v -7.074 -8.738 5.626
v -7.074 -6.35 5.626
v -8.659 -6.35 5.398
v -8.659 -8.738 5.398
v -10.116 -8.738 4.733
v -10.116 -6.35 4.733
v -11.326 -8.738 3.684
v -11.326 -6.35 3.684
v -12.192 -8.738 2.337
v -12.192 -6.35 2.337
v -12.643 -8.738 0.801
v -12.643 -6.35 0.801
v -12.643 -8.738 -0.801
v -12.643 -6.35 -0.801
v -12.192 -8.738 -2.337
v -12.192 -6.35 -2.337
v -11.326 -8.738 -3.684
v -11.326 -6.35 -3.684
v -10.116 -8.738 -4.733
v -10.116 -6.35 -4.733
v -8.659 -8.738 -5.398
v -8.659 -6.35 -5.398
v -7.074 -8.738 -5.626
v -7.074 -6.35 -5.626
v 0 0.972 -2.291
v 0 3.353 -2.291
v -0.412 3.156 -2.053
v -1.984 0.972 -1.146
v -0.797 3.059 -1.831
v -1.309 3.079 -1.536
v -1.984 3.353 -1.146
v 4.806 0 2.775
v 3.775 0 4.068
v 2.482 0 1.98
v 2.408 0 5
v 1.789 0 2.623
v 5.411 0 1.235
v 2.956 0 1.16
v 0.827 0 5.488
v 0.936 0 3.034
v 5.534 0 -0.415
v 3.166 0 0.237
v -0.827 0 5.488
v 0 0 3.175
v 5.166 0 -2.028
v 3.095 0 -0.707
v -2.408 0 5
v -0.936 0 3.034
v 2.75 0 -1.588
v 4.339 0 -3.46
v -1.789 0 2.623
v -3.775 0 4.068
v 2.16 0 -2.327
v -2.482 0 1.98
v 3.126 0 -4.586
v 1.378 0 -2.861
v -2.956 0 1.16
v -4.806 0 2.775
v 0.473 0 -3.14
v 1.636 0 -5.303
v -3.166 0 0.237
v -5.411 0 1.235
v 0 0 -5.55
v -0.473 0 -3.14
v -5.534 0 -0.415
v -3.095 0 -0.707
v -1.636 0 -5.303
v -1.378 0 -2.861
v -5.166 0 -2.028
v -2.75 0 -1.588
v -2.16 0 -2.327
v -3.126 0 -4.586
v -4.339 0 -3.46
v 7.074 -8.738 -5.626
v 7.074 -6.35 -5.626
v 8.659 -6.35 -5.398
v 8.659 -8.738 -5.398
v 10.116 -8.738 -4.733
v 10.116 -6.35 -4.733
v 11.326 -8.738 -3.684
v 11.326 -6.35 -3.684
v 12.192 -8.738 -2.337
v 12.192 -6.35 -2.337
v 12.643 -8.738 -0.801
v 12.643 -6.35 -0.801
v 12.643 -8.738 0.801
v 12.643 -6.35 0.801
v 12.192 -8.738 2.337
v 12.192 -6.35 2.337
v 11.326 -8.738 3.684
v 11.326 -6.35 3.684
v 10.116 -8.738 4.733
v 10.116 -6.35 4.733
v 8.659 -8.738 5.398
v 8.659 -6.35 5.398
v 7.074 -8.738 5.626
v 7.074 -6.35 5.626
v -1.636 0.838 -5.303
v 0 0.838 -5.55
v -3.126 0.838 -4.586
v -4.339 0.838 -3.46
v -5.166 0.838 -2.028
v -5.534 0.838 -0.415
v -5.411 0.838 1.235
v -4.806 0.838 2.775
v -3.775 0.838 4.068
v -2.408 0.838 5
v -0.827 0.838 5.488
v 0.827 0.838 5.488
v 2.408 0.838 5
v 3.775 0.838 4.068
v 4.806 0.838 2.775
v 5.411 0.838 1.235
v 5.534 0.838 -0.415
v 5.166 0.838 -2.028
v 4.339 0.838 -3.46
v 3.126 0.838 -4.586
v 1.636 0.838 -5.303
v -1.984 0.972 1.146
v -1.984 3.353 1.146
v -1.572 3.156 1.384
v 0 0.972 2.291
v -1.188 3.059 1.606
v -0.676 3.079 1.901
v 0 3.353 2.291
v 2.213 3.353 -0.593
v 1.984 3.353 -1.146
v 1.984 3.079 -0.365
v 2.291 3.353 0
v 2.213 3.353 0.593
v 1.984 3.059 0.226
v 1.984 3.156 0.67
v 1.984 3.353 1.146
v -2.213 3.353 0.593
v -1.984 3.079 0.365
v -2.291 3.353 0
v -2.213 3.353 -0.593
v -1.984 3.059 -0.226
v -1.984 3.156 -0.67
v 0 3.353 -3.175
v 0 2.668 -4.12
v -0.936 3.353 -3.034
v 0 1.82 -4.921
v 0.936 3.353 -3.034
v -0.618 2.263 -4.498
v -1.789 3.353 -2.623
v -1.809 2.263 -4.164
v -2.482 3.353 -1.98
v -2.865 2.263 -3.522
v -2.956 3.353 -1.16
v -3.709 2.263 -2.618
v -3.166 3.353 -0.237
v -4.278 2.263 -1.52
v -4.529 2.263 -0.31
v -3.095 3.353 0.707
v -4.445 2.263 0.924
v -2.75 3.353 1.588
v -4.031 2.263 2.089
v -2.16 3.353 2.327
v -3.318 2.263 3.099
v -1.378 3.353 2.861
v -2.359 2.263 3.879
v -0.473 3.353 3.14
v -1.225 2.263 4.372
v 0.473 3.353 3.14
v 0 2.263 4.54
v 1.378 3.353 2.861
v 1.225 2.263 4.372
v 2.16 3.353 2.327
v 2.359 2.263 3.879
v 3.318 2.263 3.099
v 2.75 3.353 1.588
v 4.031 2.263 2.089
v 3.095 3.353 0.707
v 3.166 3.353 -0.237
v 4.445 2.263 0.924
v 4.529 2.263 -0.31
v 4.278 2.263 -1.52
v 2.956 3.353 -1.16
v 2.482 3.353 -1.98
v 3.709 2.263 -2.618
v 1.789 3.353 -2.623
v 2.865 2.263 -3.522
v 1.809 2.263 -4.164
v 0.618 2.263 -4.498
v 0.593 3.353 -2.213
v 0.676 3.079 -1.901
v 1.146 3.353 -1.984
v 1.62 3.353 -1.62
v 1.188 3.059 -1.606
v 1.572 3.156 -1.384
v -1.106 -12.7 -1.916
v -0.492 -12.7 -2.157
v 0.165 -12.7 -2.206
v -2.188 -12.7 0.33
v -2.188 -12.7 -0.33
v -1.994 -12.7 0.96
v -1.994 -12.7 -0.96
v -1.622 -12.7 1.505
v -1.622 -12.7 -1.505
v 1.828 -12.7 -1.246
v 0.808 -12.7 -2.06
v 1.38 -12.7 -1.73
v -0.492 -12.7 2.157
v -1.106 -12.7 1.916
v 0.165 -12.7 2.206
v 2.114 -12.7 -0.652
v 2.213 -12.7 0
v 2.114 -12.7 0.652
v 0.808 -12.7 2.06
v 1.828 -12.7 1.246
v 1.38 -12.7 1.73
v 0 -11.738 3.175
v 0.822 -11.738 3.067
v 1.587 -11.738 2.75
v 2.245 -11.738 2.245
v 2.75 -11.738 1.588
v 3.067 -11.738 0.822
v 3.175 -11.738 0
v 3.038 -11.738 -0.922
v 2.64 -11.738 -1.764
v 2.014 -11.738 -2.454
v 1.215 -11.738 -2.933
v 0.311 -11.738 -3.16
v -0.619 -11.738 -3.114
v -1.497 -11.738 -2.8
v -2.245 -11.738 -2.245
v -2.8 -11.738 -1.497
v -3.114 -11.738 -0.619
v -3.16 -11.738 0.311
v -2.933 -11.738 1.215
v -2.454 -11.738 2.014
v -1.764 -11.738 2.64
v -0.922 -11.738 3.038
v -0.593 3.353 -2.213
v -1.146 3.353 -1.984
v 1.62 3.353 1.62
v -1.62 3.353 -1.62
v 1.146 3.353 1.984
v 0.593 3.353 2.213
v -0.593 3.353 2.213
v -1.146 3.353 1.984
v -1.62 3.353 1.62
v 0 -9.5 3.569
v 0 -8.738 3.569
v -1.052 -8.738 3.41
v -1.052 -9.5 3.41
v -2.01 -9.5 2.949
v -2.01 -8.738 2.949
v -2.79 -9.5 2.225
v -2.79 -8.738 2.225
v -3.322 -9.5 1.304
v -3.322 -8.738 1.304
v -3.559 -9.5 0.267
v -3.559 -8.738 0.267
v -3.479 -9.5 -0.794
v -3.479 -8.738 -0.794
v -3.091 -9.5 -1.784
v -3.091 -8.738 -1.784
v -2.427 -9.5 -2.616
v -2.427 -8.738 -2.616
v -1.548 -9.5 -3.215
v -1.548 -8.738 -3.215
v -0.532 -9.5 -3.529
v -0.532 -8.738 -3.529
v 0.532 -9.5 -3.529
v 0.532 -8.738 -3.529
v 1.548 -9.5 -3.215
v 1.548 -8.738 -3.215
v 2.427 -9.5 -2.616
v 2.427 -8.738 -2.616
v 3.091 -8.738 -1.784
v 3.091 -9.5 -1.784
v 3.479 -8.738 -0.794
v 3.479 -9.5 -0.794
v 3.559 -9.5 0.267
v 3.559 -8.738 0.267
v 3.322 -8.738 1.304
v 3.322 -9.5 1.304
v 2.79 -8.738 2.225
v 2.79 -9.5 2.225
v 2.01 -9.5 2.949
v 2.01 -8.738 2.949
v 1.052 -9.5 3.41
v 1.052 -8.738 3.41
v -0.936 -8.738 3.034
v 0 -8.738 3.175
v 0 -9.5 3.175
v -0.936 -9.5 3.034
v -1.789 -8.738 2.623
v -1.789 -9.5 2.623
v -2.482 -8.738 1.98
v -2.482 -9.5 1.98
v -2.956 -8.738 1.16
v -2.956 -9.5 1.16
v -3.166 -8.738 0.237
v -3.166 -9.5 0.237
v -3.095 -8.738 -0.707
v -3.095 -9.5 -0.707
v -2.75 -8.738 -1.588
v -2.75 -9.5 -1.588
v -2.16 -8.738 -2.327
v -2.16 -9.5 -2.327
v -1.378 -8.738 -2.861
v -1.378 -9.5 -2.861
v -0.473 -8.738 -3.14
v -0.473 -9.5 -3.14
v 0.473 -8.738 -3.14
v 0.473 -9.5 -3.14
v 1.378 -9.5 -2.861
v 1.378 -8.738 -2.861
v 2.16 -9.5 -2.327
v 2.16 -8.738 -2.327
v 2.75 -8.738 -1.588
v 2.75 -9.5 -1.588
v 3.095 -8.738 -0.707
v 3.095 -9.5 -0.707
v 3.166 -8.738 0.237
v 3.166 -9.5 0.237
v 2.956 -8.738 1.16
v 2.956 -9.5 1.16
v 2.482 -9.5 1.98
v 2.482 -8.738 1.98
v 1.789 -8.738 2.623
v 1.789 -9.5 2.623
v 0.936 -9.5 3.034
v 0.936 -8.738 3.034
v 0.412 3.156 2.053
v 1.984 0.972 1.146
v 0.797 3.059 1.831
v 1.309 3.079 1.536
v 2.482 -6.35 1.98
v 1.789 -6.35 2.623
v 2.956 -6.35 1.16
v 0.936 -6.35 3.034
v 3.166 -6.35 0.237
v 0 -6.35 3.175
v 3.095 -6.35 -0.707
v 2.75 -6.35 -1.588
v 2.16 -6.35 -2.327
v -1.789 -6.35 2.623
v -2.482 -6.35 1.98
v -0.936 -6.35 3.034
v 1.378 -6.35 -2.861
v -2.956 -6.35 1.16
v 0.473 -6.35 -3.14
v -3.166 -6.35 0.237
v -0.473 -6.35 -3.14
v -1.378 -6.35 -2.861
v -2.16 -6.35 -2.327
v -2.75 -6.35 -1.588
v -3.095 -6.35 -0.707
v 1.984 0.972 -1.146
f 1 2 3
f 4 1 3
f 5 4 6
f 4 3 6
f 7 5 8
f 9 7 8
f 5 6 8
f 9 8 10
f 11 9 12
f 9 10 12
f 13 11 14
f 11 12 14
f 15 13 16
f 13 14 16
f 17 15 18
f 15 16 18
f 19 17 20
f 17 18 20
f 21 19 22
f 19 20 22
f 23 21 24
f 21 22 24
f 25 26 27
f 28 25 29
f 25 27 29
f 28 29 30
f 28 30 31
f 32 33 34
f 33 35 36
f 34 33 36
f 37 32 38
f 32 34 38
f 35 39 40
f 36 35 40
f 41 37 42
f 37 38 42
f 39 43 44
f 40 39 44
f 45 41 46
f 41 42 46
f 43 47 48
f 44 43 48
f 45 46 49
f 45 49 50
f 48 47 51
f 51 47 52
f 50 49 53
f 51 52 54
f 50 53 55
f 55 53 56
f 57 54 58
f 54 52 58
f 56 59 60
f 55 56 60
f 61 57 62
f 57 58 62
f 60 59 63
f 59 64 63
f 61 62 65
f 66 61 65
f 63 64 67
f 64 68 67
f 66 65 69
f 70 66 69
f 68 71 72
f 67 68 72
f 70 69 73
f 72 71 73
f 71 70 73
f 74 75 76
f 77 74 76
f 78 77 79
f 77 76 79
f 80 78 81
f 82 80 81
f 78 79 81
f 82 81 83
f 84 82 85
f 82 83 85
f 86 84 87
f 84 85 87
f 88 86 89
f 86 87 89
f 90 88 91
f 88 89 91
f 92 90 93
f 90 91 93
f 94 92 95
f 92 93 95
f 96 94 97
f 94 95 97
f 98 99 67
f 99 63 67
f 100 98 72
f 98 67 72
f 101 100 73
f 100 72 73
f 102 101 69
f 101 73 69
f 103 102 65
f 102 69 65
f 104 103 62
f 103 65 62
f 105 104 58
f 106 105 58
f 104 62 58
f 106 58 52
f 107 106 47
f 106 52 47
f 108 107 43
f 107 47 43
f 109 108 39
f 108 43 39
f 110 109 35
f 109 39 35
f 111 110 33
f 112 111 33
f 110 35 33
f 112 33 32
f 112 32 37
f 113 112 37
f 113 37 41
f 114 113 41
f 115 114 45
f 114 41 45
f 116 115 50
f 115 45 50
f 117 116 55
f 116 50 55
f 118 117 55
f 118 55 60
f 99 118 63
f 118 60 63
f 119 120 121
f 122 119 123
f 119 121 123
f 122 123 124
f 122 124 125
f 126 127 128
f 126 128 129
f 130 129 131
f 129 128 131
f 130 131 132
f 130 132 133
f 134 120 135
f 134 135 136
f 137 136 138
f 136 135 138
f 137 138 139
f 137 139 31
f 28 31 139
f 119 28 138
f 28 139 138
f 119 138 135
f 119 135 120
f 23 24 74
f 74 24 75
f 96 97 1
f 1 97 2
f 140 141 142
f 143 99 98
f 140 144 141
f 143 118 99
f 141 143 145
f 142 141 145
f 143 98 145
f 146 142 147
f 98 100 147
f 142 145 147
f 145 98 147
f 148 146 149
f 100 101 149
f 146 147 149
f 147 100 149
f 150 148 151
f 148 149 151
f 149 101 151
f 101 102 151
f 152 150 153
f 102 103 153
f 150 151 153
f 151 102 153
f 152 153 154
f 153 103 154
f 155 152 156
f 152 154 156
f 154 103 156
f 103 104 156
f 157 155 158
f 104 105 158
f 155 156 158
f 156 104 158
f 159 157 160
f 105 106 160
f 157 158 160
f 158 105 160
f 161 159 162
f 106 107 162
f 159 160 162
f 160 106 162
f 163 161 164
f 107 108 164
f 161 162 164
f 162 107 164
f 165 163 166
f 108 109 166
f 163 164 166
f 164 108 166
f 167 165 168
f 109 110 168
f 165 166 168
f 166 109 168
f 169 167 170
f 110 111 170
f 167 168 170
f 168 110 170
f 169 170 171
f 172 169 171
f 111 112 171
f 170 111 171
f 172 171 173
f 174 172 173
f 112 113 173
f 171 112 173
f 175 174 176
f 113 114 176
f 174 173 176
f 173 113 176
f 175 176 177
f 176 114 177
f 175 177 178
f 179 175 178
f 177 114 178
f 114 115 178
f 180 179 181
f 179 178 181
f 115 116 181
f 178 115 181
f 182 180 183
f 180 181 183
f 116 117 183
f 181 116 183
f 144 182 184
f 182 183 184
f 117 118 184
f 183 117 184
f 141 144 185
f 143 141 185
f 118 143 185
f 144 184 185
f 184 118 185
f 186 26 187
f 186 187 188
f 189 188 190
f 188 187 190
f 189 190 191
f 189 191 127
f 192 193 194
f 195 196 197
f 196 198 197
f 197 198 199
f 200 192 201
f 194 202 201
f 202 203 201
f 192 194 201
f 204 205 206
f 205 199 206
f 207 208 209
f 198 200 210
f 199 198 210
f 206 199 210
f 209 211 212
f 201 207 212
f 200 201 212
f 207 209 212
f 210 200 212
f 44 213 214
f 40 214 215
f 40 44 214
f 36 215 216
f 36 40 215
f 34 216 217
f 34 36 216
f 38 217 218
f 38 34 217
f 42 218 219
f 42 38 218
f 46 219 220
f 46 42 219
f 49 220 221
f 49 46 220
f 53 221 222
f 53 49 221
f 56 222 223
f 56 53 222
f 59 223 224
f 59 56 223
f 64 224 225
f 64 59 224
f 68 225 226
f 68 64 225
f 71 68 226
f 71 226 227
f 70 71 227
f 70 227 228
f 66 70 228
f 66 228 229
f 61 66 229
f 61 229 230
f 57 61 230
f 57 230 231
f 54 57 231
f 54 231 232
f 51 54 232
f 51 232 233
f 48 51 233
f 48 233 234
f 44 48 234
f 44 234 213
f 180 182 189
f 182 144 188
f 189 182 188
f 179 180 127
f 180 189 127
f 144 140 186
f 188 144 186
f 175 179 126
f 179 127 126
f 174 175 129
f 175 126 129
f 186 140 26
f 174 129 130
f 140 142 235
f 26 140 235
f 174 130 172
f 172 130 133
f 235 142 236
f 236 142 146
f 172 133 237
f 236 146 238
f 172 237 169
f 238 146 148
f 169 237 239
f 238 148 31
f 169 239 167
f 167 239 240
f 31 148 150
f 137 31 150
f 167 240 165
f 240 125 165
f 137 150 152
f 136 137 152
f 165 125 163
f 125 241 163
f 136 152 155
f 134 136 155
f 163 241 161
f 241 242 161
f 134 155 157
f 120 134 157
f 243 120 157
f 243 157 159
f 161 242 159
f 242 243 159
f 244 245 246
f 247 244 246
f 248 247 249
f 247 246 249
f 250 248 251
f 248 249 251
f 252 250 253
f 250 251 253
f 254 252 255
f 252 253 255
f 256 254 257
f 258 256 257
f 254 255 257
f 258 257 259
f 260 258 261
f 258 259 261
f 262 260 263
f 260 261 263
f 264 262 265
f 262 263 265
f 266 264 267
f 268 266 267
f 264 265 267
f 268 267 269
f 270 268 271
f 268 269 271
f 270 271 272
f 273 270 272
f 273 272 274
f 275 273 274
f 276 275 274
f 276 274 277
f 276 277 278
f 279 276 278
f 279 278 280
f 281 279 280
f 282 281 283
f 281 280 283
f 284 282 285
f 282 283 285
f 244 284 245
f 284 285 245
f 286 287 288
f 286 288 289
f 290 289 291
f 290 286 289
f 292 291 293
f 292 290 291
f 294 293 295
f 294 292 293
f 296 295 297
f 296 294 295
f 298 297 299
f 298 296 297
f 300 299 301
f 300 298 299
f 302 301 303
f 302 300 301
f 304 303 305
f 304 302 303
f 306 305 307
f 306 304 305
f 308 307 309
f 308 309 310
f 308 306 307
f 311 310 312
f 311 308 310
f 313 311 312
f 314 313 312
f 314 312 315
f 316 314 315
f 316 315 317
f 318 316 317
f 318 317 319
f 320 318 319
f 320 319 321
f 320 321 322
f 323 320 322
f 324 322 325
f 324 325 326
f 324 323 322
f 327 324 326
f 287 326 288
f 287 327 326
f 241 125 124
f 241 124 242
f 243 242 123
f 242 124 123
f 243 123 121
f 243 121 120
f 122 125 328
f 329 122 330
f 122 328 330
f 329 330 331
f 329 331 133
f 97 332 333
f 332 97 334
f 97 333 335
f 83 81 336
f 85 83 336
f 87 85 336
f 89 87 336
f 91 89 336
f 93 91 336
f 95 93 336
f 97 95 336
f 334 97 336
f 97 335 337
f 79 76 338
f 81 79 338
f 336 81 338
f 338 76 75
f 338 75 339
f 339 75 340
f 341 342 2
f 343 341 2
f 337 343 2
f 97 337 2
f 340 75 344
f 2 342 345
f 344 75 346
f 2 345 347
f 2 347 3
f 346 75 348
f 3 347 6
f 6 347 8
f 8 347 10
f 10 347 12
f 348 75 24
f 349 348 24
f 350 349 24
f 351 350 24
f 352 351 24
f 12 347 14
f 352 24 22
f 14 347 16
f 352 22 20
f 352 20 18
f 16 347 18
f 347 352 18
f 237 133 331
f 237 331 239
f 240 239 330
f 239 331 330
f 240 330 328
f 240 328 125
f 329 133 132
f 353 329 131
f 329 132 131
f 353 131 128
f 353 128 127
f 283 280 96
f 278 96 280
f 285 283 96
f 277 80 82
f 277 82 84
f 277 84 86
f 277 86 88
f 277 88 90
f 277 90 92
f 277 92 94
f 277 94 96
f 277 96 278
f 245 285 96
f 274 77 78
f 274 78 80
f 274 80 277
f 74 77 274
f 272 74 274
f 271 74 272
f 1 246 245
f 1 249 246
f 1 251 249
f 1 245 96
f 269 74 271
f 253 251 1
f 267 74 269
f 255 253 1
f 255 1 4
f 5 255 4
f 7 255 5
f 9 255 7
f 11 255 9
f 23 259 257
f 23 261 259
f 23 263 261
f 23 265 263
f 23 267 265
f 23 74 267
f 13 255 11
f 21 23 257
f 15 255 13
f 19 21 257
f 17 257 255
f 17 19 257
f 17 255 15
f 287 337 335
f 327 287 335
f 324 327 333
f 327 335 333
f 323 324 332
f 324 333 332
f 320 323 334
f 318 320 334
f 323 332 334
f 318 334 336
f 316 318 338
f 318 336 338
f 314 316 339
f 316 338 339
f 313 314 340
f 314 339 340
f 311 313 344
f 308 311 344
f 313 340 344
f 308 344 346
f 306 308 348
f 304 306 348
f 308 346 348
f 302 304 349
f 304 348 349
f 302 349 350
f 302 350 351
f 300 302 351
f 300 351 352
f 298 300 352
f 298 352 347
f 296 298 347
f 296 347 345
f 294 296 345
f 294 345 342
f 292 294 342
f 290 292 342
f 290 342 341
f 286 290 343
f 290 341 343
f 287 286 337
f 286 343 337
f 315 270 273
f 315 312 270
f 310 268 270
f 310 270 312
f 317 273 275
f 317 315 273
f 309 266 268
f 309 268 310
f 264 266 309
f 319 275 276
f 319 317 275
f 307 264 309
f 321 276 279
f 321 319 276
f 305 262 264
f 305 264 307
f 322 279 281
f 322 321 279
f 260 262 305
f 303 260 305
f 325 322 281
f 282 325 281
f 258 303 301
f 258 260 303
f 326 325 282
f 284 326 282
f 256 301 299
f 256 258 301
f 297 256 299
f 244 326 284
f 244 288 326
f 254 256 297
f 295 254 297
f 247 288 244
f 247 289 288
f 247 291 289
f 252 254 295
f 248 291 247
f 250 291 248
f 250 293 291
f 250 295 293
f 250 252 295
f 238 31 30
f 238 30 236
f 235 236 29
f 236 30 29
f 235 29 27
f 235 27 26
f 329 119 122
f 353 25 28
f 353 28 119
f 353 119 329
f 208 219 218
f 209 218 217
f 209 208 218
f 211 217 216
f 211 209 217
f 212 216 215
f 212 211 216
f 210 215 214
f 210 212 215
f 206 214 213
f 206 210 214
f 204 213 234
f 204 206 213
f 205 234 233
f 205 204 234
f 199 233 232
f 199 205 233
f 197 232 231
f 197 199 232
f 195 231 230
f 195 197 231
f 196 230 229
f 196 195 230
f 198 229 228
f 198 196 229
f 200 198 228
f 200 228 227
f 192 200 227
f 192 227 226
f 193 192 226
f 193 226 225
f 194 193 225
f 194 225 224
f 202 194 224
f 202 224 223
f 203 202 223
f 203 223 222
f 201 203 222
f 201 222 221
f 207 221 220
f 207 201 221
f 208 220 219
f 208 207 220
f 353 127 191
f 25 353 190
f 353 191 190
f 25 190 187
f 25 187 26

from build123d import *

# Parameters (mm, degrees)
SKETCH1_R           = 3.175
BOSS_EXTRUDE1_DEPTH = 12.7
SKETCH4_OUTSIDE_W   = 14
SKETCH4_OUTSIDE_H   = 14
SKETCH4_OUTSIDE_R   = 2.21262927
CUT_EXTRUDE1_DEPTH  = 1.27
CUT_EXTRUDE1_DRAFT  = -45
CUT_EXTRUDE2_DEPTH  = 2.38125
BOSS_EXTRUDE2_START = -6.35
SKETCH8_R           = 3.175
BOSS_EXTRUDE2_DEPTH = 2.3876
SKETCH9_R           = 3.5687
SKETCH9_R_2         = 3.175
BOSS_EXTRUDE3_DEPTH = 0.762


with BuildPart() as part:
    # Sketch1 → Boss-Extrude1 (new body)
    with BuildSketch(Plane(origin=(0, 0, 0), x_dir=(1, 0, 0), z_dir=(0, 1, 0))):
        Circle(SKETCH1_R)
    extrude(amount=-BOSS_EXTRUDE1_DEPTH)


with BuildPart() as cut_extrude1_tool:
    # Sketch4 outside → Cut-Extrude1 (with draft: the straight prism first)
    with BuildSketch(Plane.XZ.offset(12.7)):
        Rectangle(SKETCH4_OUTSIDE_W, SKETCH4_OUTSIDE_H)
        Circle(SKETCH4_OUTSIDE_R, mode=Mode.SUBTRACT)
    extrude(amount=-CUT_EXTRUDE1_DEPTH)
    # Cut-Extrude1: the draft: its side faces are tilted about the plane it starts from
    cut_extrude1_sides = [cut_extrude1_tool.faces().sort_by_distance(p)[0] for p in [
        (0, -12.065, -7),
        (7, -12.065, 0),
        (0, -12.065, 7),
        (-7, -12.065, 0),
        (-2.21262927, -12.065, 0),
    ]]
    draft(cut_extrude1_sides, Plane.XZ.offset(12.7), CUT_EXTRUDE1_DRAFT)


with BuildPart() as part_1:
    add(part.part)

    # Cut-Extrude1: cut by cut_extrude1_tool
    add(cut_extrude1_tool.part, mode=Mode.SUBTRACT)

    # Sketch5 → Revolve1 (revolve)
    with BuildSketch(Plane.XY):
        with BuildLine():
            Line((0, 0), (0, 3.3528))
            Line((0, 3.3528), (-3.175, 3.3528))
            ThreePointArc((-3.175, 3.3528), (-4.540019085, 2.263204136), (-5.5499, 0.8382))
            Line((-5.5499, 0.8382), (-5.5499, 0))
            Line((-5.5499, 0), (0, 0))
        make_face()
    revolve(axis=Axis((0, 0, 0), (0, 1, 0)))

    # Sketch6 → Cut-Extrude2 (cut)
    with BuildSketch(Plane(origin=(0, 3.3528, 0), x_dir=(1, 0, 0), z_dir=(0, 1, 0))):
        Polygon((0, 2.291358881), (-1.984375, 1.14567944), (-1.984375, -1.14567944), (0, -2.291358881), (1.984375, -1.14567944), (1.984375, 1.14567944), align=None)
    extrude(amount=-CUT_EXTRUDE2_DEPTH, mode=Mode.SUBTRACT)

    # Cut-Extrude3 cone 1 section (through the dimple's axis) → Cut-Extrude3 (revolve, cut)
    with BuildSketch(Plane(origin=(0, 3.3528, 0), x_dir=(0, 0, 1), z_dir=(1, 0, 0))):
        Polygon((0, 0), (2.291358881, 0), (0, 2.291358881), align=None)
    revolve(axis=Axis((0, 3.3528, 0), (0, -1, 0)), mode=Mode.SUBTRACT)


with BuildPart() as body_2:
    # Sketch8 → Boss-Extrude2 (new body)
    with BuildSketch(Plane(origin=(0, 0, 0), x_dir=(1, 0, 0), z_dir=(0, 1, 0)).offset(BOSS_EXTRUDE2_START)):
        with BuildLine():
            Line((-7.0739, 5.6261), (7.0739, 5.6261))
            ThreePointArc((7.0739, 5.6261), (12.7, 0), (7.0739, -5.6261))
            Line((7.0739, -5.6261), (-7.0739, -5.6261))
            ThreePointArc((-7.0739, -5.6261), (-12.7, 0), (-7.0739, 5.6261))
        make_face()
        Circle(SKETCH8_R, mode=Mode.SUBTRACT)
    extrude(amount=-BOSS_EXTRUDE2_DEPTH)

    # Sketch9 → Boss-Extrude3 (add)
    with BuildSketch(Plane.XZ.offset(8.7376)):
        Circle(SKETCH9_R)
        Circle(SKETCH9_R_2, mode=Mode.SUBTRACT)
    extrude(amount=BOSS_EXTRUDE3_DEPTH)


solid = Compound([part_1.part, body_2.part])
